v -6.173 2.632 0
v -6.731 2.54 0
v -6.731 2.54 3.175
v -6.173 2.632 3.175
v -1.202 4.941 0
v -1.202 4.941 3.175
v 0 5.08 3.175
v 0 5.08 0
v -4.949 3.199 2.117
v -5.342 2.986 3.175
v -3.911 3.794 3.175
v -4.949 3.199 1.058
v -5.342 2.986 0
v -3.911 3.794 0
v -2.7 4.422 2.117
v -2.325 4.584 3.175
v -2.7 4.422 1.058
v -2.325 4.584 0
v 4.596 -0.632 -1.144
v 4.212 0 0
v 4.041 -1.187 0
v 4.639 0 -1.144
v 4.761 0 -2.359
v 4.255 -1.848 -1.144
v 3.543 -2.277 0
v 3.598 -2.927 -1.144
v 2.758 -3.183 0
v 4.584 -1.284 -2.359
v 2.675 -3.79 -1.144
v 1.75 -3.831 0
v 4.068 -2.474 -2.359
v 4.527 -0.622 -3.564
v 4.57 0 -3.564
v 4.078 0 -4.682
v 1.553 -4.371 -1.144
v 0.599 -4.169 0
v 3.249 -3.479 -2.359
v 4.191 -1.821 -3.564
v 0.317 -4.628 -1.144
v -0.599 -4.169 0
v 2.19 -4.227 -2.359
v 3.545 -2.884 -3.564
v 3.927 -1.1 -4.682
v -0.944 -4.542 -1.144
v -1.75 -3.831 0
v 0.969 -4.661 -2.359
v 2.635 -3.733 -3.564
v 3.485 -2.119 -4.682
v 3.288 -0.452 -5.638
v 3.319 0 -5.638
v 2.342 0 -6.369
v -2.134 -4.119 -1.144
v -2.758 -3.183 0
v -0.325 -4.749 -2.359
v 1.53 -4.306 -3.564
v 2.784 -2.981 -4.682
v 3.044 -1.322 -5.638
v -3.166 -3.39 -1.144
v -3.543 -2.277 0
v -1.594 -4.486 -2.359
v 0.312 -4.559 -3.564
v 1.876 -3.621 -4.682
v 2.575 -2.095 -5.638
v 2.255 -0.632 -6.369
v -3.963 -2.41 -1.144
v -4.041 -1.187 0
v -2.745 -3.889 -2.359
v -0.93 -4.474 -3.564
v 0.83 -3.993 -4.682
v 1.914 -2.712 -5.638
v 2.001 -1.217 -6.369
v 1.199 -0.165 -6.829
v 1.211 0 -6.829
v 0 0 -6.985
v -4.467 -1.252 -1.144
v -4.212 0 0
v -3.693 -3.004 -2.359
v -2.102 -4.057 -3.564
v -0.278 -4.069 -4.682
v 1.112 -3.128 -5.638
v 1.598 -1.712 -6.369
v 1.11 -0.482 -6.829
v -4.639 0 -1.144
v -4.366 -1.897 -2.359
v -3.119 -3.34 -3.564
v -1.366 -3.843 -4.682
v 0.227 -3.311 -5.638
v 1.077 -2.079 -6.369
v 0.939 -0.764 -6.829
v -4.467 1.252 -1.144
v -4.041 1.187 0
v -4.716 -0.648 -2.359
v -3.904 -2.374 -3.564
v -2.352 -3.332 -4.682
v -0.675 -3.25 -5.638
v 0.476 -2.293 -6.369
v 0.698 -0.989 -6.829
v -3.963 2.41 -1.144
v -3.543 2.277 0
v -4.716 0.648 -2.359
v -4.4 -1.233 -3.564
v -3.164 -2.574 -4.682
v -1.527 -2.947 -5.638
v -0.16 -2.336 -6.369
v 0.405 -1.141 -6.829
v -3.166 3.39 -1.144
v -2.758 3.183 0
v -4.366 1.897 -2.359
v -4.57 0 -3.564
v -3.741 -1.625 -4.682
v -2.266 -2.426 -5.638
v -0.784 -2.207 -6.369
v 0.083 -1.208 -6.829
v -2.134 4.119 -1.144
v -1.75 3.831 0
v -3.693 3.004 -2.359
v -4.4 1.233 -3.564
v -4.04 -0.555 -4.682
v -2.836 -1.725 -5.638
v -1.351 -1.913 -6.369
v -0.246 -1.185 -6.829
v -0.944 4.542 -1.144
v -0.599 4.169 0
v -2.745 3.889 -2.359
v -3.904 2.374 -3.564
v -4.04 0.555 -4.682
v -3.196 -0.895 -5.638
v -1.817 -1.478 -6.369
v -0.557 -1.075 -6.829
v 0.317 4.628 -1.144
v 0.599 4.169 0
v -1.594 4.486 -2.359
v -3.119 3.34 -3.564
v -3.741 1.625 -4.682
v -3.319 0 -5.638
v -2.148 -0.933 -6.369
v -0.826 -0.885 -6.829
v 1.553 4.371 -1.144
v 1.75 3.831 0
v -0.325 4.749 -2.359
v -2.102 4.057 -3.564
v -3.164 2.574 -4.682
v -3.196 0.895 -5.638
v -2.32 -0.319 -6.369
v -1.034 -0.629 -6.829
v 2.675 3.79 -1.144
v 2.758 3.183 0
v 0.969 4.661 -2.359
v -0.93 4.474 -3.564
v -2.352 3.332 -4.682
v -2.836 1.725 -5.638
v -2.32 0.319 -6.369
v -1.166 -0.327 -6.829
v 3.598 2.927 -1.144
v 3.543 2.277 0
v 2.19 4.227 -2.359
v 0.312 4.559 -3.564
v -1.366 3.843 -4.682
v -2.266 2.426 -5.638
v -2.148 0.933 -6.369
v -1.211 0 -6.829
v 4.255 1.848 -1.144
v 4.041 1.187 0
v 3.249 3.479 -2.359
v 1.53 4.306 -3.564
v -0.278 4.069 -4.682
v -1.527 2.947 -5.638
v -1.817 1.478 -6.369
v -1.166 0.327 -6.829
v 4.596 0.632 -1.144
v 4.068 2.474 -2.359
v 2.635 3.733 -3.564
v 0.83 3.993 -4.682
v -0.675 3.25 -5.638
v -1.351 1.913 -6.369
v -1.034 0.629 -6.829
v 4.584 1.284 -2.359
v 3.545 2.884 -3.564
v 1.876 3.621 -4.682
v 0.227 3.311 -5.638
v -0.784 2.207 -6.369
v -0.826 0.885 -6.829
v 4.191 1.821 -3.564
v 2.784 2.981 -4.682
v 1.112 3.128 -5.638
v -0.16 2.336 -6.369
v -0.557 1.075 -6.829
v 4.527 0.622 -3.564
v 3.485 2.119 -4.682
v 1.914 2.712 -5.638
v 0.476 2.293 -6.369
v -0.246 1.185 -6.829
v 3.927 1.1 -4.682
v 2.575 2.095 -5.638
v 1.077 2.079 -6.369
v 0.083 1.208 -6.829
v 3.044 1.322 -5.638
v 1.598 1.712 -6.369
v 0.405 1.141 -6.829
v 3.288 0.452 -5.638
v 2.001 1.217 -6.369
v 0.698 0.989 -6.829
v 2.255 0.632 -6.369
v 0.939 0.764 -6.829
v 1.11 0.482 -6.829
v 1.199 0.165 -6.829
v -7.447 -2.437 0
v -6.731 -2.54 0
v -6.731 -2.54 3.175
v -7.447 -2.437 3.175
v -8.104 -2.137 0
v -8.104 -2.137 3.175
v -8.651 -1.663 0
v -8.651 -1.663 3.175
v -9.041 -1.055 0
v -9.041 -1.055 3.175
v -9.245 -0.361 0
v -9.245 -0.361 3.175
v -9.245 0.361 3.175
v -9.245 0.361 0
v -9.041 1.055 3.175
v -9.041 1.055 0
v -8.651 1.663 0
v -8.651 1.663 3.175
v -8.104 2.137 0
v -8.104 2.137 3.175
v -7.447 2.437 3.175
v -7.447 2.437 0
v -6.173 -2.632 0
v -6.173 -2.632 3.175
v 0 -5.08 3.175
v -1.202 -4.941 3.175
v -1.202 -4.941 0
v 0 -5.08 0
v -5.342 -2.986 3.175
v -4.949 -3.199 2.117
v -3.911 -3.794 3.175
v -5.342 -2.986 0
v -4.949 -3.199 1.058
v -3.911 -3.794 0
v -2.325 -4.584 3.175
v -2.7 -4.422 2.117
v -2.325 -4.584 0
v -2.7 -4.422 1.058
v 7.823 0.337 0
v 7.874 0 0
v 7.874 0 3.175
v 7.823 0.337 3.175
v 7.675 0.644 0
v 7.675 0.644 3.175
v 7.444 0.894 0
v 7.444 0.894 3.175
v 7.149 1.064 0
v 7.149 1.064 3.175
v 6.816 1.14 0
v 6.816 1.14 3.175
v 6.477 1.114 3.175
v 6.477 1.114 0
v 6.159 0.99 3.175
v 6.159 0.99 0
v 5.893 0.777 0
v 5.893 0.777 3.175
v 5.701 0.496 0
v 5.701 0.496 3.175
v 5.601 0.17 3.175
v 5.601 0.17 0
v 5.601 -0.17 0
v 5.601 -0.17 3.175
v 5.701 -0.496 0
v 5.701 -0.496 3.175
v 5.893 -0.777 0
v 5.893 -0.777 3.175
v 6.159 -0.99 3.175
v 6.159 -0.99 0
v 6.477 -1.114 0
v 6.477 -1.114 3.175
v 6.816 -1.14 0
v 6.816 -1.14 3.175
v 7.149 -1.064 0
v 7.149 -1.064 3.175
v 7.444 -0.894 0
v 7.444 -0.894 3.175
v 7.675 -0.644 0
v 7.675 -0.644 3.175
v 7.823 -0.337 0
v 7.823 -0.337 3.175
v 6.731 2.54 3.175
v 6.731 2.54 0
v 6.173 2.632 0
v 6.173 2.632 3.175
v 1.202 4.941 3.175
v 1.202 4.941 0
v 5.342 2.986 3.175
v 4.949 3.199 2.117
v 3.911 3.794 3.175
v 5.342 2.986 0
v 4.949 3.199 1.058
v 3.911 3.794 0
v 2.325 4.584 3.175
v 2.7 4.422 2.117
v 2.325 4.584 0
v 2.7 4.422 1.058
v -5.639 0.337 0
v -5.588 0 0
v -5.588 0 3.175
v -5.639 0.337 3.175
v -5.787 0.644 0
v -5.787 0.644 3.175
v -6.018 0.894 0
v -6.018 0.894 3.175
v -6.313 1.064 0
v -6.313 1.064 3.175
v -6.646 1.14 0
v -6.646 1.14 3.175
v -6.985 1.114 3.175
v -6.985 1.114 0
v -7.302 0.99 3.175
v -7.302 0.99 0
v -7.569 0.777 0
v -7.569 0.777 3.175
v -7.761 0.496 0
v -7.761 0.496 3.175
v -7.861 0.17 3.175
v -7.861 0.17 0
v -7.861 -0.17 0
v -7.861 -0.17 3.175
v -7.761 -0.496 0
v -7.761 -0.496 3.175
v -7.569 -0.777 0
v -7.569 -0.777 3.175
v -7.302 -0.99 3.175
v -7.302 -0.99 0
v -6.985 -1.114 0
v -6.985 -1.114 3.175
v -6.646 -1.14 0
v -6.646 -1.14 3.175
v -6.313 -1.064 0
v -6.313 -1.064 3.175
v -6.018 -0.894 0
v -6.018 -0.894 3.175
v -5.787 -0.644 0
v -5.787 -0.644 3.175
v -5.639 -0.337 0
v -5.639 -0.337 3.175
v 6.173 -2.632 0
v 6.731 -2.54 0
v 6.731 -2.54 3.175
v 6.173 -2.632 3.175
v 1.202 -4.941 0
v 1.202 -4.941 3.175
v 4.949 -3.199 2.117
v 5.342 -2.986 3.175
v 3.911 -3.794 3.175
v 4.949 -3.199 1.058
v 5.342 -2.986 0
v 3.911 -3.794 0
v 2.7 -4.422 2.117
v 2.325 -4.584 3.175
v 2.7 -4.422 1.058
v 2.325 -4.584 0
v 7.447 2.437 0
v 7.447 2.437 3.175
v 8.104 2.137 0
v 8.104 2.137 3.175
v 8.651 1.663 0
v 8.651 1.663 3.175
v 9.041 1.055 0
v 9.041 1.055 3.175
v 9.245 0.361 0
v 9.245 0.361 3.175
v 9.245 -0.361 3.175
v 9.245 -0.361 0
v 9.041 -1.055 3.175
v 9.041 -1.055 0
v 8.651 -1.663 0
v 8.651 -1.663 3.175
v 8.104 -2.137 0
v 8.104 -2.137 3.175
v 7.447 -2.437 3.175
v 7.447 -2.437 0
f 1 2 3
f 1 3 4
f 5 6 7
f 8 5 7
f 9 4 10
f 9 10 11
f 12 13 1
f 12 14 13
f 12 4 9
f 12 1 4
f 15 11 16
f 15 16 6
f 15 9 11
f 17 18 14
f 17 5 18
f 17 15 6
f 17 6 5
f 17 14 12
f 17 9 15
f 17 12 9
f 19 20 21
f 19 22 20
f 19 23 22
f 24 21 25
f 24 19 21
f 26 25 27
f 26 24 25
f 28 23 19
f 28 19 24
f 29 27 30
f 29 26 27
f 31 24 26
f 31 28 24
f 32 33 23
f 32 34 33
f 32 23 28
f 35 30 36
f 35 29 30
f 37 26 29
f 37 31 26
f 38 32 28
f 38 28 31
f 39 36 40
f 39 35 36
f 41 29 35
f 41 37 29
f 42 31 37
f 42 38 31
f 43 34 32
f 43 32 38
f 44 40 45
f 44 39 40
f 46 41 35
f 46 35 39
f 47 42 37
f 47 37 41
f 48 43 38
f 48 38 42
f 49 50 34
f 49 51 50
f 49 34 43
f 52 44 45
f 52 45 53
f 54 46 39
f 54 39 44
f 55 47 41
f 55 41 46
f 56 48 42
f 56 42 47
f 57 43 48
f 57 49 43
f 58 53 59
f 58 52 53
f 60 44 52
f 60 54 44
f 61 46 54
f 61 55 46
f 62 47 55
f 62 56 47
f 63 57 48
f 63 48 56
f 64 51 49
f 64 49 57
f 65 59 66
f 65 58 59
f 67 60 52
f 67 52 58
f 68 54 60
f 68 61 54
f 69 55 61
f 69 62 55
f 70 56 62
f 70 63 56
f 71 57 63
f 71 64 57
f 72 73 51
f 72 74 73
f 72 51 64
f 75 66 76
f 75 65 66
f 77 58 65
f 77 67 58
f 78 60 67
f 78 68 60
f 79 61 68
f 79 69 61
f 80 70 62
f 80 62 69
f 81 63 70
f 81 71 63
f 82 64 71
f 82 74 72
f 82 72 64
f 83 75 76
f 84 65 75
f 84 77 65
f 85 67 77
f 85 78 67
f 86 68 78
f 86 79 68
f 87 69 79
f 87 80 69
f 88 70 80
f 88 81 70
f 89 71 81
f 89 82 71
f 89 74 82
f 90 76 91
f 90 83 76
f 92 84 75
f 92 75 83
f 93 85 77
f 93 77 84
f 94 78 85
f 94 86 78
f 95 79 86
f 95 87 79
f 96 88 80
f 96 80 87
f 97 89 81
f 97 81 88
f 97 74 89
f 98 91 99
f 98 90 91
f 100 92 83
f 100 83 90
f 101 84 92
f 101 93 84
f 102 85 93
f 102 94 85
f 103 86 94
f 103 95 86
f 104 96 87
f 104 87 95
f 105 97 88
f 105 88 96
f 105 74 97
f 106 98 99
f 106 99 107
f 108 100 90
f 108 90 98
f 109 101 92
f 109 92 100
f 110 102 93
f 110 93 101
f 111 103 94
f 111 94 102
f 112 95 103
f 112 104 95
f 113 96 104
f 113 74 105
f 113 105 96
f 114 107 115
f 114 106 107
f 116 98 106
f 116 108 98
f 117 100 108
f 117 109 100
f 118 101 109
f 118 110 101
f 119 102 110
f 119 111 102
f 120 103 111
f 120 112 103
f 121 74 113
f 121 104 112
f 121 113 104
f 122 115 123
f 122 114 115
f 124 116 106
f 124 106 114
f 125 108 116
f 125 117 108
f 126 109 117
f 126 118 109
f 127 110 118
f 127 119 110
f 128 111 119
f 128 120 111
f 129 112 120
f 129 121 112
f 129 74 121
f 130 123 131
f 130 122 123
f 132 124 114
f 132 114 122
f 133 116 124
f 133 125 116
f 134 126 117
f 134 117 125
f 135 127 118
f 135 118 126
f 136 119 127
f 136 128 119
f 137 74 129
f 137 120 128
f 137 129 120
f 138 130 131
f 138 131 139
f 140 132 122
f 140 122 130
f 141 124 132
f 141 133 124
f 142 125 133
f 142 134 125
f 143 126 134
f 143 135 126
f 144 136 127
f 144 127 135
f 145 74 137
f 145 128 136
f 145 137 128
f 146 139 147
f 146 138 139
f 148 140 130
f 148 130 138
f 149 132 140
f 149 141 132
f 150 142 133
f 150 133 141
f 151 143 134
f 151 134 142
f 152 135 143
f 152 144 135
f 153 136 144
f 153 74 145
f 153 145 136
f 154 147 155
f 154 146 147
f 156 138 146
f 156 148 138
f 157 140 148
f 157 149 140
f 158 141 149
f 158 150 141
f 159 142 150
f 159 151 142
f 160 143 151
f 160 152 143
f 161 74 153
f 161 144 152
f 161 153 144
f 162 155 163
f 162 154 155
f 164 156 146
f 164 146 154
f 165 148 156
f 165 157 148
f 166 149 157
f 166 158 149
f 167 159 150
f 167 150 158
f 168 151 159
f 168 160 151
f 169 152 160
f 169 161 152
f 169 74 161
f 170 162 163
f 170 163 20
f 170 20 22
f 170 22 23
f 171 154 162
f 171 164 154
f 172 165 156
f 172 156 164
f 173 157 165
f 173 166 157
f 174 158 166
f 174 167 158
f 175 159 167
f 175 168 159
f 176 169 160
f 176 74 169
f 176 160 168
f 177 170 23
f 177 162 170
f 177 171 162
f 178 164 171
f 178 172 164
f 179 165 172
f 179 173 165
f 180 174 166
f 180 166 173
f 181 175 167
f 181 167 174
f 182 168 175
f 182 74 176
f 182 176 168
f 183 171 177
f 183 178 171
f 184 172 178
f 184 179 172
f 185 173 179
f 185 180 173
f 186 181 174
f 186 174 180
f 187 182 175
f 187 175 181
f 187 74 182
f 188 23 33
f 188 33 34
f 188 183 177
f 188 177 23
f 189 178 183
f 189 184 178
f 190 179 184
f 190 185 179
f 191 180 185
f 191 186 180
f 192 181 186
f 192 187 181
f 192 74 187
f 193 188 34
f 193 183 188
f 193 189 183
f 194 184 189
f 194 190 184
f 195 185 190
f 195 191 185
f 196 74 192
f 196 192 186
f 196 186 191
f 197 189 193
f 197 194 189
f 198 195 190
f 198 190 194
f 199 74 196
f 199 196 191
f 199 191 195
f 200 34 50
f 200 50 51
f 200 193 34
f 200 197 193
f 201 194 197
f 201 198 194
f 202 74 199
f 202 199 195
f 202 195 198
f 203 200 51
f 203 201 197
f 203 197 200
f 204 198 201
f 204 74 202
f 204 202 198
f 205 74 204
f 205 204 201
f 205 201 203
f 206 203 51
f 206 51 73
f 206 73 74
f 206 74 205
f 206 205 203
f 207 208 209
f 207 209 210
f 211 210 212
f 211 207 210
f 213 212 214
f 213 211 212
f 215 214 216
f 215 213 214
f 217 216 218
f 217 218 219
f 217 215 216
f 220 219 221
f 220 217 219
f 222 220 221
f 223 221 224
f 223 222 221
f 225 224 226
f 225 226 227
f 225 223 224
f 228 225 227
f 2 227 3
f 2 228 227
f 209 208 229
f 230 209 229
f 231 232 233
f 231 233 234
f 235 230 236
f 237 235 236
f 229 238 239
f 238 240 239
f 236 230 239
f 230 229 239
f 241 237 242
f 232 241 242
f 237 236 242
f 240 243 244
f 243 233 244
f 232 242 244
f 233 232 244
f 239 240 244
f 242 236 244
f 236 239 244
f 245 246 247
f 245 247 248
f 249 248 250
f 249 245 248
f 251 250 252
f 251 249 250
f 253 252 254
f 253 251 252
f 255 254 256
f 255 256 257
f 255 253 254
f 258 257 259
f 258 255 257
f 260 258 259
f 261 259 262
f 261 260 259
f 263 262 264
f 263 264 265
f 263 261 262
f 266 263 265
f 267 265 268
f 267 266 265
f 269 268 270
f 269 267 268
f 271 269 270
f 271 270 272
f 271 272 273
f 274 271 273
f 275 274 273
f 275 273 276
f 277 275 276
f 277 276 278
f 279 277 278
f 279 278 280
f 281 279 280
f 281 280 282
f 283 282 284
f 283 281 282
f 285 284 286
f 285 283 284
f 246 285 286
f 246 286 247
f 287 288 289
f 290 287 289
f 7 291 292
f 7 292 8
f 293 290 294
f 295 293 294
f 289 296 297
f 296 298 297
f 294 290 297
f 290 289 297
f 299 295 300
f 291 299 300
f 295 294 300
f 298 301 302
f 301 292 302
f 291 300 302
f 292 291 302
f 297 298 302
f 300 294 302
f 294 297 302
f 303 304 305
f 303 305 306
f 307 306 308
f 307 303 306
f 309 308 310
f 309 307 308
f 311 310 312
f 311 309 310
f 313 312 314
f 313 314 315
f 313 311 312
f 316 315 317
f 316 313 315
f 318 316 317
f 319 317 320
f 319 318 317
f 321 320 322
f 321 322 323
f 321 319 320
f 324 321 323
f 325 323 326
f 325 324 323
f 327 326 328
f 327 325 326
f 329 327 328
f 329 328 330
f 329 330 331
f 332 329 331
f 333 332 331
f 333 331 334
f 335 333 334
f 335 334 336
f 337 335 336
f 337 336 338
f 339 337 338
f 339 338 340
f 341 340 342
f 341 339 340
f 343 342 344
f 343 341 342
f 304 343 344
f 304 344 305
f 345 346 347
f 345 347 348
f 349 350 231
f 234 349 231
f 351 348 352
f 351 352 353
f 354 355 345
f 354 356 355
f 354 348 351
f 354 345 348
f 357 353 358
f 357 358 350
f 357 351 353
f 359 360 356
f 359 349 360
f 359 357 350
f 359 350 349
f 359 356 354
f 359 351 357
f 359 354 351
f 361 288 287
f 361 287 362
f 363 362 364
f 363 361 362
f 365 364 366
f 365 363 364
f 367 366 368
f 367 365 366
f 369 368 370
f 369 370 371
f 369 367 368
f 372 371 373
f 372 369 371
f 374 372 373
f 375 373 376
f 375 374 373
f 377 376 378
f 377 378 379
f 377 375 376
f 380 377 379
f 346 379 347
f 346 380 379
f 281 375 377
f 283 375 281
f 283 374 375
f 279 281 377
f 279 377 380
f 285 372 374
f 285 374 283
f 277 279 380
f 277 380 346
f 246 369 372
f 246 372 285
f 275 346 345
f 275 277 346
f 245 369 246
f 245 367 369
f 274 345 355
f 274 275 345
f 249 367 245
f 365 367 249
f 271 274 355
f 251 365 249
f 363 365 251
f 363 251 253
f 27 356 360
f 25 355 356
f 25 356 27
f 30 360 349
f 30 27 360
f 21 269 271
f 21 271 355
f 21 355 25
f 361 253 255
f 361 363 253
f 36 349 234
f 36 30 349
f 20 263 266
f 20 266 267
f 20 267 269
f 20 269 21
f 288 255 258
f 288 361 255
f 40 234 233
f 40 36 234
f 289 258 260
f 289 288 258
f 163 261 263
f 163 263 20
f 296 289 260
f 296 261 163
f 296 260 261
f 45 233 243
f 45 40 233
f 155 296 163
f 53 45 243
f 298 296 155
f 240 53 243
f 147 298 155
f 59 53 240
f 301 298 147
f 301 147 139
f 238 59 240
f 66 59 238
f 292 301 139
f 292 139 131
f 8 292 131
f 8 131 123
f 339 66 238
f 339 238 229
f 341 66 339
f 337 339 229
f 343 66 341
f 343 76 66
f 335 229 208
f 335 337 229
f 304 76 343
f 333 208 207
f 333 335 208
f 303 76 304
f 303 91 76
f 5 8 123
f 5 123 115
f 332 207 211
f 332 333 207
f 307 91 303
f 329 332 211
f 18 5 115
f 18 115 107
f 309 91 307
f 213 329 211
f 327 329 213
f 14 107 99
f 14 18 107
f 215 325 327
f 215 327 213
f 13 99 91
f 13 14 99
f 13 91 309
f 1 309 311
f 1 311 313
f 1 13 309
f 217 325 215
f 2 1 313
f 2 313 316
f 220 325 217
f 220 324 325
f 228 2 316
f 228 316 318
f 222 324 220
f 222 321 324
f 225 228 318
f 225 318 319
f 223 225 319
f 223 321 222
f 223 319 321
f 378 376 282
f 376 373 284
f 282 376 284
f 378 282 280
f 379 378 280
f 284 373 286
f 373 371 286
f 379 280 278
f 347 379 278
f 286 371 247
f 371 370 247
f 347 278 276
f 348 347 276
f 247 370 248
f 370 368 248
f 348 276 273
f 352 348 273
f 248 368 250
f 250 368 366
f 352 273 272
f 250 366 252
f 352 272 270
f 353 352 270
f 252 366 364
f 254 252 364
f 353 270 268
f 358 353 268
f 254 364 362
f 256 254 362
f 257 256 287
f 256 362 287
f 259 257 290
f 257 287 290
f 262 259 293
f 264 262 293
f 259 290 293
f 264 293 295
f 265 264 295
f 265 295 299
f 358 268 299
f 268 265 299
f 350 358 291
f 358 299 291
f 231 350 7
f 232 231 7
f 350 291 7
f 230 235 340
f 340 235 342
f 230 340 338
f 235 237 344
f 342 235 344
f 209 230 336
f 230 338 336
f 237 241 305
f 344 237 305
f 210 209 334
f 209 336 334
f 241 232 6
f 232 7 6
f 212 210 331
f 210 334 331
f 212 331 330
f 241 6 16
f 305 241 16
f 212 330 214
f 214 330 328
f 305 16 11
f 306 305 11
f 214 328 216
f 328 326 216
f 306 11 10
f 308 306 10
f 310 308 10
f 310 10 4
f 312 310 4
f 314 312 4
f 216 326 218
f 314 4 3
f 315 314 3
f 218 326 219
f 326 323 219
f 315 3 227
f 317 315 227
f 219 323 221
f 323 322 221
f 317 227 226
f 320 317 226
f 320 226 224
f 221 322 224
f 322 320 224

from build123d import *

# Parameters (mm, degrees)
SKETCH1_R           = 1.143
BOSS_EXTRUDE1_DEPTH = 3.175


with BuildPart() as part:
    # Sketch1 → Boss-Extrude1 (new body)
    with BuildSketch(Plane.XY):
        with BuildLine():
            ThreePointArc((-6.731, -2.54), (-9.271, 0), (-6.731, 2.54))
            add(Edge.make_bspline(
                [(-6.731, 2.54), (-5.187542856, 2.54), (-2.92113625, 5.080180466), (0, 5.08)],
                knots=[0, 0, 0, 0, 1, 1, 1, 1], degree=3))
            add(Edge.make_bspline(
                [(6.731, 2.54), (5.187542856, 2.54), (2.92113625, 5.080180466), (0, 5.08)],
                knots=[0, 0, 0, 0, 1, 1, 1, 1], degree=3))
            ThreePointArc((6.731, 2.54), (9.271, 0), (6.731, -2.54))
            add(Edge.make_bspline(
                [(6.731, -2.54), (5.187542856, -2.54), (2.92113625, -5.080180466), (0, -5.08)],
                knots=[0, 0, 0, 0, 1, 1, 1, 1], degree=3))
            add(Edge.make_bspline(
                [(-6.731, -2.54), (-5.187542856, -2.54), (-2.92113625, -5.080180466), (0, -5.08)],
                knots=[0, 0, 0, 0, 1, 1, 1, 1], degree=3))
        make_face()
        with Locations((6.731, 0)):
            Circle(SKETCH1_R, mode=Mode.SUBTRACT)
        with Locations((-6.731, 0)):
            Circle(SKETCH1_R, mode=Mode.SUBTRACT)
    extrude(amount=BOSS_EXTRUDE1_DEPTH)

    # Sketch4 → Revolve1 (revolve)
    with BuildSketch(Plane(origin=(0, 0, 0), x_dir=(1, 0, 0), z_dir=(0, 1, 0))):
        with BuildLine():
            Line((0, 0), (4.212113484, 0))
            ThreePointArc((4.212113484, 0), (4.078361344, 4.681844425), (0, 6.985))
            Line((0, 6.985), (0, 0))
        make_face()
    revolve(axis=Axis((0, 0, 0), (0, 0, -1)))


solid = part.part
